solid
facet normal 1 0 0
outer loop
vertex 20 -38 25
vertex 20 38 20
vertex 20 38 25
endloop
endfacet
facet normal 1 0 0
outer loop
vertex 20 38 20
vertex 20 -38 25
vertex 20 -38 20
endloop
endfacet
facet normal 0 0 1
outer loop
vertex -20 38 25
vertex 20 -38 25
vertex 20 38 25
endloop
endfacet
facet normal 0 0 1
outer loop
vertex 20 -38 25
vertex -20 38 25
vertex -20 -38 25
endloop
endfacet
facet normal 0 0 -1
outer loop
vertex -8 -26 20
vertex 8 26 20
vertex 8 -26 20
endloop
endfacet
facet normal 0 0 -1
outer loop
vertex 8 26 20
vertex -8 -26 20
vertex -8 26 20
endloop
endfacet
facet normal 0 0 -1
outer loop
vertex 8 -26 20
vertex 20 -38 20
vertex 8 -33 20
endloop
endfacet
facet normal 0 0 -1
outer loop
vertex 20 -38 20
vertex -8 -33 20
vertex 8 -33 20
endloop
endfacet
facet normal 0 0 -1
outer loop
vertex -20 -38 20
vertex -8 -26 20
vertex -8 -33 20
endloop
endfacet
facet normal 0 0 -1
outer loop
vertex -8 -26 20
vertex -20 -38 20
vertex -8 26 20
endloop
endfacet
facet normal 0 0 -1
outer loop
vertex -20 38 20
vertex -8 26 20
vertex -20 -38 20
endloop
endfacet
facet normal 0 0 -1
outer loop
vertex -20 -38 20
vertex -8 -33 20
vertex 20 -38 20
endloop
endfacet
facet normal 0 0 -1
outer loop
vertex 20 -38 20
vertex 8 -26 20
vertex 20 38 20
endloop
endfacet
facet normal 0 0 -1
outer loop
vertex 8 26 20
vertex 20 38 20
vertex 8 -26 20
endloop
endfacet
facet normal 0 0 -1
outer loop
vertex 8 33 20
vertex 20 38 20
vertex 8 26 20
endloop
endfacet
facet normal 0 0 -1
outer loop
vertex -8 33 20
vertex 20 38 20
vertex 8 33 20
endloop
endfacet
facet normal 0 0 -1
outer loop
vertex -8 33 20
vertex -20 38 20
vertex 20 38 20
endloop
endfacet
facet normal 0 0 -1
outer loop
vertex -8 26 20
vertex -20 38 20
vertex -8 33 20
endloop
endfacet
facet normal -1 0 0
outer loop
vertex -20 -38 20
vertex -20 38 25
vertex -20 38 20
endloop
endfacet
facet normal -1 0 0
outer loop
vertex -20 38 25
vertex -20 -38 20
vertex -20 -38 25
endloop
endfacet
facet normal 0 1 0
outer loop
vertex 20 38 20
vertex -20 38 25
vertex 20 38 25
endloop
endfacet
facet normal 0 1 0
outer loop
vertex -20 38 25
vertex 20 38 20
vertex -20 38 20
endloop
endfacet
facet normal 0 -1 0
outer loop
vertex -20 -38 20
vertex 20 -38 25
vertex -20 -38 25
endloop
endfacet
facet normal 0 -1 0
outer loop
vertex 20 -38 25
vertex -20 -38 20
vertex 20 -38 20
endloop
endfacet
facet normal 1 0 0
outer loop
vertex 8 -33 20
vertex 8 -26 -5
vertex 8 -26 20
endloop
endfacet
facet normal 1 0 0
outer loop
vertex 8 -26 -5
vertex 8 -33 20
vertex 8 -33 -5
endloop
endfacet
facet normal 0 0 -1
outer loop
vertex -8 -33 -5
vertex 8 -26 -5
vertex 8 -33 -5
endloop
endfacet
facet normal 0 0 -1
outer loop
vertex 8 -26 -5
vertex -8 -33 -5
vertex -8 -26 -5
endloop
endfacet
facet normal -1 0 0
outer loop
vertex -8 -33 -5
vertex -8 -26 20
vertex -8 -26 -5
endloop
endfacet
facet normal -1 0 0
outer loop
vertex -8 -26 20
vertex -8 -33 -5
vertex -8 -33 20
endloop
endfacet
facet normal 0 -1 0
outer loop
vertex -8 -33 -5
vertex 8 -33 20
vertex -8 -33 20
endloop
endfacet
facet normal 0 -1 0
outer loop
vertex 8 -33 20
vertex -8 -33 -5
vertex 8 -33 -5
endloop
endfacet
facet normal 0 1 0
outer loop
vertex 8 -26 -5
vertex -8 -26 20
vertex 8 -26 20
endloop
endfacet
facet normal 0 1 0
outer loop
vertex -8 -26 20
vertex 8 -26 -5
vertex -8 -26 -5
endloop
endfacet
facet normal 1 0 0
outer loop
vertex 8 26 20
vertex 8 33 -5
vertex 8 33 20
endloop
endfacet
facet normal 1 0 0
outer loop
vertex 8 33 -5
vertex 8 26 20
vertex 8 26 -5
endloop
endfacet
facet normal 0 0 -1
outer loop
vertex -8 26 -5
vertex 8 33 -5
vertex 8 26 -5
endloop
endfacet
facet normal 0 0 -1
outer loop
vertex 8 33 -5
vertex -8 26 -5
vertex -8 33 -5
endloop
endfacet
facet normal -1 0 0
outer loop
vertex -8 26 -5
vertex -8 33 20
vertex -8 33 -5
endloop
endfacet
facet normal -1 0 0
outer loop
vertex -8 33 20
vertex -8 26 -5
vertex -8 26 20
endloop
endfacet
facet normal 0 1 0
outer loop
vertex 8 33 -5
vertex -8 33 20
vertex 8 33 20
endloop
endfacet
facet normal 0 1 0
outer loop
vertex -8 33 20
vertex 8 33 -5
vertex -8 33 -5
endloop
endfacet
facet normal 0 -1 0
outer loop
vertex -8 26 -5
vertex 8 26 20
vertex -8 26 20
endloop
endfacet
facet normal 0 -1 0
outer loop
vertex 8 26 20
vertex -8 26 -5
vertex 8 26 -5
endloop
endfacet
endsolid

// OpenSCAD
// Two-jaw pickup concept, mm. Linkage/bearings/horn must follow the chosen servo.
ball_d = 40;
open = true;
pad_t = 2;
finger_t = 5;
finger_h = 30;
gap = open ? 52 : ball_d - 0.5; // Nominal pad compression; verify force on actual ball.
$fn = 64;
assert(ball_d >= 35 && ball_d <= 45);
color("steelblue") difference() {
    translate([-20,-38,20]) cube([40,76,5]);
    for (y=[-30,30]) translate([0,y,19]) cylinder(h=7,d=4.5);
}
for (side=[-1,1]) {
    color("orange") translate([-8, side*(gap/2+pad_t+finger_t/2)-finger_t/2,-5])
        cube([16,finger_t,finger_h]);
    color("gray") translate([-8,side*(gap/2+pad_t/2)-pad_t/2,-5])
        cube([16,pad_t,finger_h]);
}
if ($preview) color([1,1,1,.5]) sphere(d=ball_d);
